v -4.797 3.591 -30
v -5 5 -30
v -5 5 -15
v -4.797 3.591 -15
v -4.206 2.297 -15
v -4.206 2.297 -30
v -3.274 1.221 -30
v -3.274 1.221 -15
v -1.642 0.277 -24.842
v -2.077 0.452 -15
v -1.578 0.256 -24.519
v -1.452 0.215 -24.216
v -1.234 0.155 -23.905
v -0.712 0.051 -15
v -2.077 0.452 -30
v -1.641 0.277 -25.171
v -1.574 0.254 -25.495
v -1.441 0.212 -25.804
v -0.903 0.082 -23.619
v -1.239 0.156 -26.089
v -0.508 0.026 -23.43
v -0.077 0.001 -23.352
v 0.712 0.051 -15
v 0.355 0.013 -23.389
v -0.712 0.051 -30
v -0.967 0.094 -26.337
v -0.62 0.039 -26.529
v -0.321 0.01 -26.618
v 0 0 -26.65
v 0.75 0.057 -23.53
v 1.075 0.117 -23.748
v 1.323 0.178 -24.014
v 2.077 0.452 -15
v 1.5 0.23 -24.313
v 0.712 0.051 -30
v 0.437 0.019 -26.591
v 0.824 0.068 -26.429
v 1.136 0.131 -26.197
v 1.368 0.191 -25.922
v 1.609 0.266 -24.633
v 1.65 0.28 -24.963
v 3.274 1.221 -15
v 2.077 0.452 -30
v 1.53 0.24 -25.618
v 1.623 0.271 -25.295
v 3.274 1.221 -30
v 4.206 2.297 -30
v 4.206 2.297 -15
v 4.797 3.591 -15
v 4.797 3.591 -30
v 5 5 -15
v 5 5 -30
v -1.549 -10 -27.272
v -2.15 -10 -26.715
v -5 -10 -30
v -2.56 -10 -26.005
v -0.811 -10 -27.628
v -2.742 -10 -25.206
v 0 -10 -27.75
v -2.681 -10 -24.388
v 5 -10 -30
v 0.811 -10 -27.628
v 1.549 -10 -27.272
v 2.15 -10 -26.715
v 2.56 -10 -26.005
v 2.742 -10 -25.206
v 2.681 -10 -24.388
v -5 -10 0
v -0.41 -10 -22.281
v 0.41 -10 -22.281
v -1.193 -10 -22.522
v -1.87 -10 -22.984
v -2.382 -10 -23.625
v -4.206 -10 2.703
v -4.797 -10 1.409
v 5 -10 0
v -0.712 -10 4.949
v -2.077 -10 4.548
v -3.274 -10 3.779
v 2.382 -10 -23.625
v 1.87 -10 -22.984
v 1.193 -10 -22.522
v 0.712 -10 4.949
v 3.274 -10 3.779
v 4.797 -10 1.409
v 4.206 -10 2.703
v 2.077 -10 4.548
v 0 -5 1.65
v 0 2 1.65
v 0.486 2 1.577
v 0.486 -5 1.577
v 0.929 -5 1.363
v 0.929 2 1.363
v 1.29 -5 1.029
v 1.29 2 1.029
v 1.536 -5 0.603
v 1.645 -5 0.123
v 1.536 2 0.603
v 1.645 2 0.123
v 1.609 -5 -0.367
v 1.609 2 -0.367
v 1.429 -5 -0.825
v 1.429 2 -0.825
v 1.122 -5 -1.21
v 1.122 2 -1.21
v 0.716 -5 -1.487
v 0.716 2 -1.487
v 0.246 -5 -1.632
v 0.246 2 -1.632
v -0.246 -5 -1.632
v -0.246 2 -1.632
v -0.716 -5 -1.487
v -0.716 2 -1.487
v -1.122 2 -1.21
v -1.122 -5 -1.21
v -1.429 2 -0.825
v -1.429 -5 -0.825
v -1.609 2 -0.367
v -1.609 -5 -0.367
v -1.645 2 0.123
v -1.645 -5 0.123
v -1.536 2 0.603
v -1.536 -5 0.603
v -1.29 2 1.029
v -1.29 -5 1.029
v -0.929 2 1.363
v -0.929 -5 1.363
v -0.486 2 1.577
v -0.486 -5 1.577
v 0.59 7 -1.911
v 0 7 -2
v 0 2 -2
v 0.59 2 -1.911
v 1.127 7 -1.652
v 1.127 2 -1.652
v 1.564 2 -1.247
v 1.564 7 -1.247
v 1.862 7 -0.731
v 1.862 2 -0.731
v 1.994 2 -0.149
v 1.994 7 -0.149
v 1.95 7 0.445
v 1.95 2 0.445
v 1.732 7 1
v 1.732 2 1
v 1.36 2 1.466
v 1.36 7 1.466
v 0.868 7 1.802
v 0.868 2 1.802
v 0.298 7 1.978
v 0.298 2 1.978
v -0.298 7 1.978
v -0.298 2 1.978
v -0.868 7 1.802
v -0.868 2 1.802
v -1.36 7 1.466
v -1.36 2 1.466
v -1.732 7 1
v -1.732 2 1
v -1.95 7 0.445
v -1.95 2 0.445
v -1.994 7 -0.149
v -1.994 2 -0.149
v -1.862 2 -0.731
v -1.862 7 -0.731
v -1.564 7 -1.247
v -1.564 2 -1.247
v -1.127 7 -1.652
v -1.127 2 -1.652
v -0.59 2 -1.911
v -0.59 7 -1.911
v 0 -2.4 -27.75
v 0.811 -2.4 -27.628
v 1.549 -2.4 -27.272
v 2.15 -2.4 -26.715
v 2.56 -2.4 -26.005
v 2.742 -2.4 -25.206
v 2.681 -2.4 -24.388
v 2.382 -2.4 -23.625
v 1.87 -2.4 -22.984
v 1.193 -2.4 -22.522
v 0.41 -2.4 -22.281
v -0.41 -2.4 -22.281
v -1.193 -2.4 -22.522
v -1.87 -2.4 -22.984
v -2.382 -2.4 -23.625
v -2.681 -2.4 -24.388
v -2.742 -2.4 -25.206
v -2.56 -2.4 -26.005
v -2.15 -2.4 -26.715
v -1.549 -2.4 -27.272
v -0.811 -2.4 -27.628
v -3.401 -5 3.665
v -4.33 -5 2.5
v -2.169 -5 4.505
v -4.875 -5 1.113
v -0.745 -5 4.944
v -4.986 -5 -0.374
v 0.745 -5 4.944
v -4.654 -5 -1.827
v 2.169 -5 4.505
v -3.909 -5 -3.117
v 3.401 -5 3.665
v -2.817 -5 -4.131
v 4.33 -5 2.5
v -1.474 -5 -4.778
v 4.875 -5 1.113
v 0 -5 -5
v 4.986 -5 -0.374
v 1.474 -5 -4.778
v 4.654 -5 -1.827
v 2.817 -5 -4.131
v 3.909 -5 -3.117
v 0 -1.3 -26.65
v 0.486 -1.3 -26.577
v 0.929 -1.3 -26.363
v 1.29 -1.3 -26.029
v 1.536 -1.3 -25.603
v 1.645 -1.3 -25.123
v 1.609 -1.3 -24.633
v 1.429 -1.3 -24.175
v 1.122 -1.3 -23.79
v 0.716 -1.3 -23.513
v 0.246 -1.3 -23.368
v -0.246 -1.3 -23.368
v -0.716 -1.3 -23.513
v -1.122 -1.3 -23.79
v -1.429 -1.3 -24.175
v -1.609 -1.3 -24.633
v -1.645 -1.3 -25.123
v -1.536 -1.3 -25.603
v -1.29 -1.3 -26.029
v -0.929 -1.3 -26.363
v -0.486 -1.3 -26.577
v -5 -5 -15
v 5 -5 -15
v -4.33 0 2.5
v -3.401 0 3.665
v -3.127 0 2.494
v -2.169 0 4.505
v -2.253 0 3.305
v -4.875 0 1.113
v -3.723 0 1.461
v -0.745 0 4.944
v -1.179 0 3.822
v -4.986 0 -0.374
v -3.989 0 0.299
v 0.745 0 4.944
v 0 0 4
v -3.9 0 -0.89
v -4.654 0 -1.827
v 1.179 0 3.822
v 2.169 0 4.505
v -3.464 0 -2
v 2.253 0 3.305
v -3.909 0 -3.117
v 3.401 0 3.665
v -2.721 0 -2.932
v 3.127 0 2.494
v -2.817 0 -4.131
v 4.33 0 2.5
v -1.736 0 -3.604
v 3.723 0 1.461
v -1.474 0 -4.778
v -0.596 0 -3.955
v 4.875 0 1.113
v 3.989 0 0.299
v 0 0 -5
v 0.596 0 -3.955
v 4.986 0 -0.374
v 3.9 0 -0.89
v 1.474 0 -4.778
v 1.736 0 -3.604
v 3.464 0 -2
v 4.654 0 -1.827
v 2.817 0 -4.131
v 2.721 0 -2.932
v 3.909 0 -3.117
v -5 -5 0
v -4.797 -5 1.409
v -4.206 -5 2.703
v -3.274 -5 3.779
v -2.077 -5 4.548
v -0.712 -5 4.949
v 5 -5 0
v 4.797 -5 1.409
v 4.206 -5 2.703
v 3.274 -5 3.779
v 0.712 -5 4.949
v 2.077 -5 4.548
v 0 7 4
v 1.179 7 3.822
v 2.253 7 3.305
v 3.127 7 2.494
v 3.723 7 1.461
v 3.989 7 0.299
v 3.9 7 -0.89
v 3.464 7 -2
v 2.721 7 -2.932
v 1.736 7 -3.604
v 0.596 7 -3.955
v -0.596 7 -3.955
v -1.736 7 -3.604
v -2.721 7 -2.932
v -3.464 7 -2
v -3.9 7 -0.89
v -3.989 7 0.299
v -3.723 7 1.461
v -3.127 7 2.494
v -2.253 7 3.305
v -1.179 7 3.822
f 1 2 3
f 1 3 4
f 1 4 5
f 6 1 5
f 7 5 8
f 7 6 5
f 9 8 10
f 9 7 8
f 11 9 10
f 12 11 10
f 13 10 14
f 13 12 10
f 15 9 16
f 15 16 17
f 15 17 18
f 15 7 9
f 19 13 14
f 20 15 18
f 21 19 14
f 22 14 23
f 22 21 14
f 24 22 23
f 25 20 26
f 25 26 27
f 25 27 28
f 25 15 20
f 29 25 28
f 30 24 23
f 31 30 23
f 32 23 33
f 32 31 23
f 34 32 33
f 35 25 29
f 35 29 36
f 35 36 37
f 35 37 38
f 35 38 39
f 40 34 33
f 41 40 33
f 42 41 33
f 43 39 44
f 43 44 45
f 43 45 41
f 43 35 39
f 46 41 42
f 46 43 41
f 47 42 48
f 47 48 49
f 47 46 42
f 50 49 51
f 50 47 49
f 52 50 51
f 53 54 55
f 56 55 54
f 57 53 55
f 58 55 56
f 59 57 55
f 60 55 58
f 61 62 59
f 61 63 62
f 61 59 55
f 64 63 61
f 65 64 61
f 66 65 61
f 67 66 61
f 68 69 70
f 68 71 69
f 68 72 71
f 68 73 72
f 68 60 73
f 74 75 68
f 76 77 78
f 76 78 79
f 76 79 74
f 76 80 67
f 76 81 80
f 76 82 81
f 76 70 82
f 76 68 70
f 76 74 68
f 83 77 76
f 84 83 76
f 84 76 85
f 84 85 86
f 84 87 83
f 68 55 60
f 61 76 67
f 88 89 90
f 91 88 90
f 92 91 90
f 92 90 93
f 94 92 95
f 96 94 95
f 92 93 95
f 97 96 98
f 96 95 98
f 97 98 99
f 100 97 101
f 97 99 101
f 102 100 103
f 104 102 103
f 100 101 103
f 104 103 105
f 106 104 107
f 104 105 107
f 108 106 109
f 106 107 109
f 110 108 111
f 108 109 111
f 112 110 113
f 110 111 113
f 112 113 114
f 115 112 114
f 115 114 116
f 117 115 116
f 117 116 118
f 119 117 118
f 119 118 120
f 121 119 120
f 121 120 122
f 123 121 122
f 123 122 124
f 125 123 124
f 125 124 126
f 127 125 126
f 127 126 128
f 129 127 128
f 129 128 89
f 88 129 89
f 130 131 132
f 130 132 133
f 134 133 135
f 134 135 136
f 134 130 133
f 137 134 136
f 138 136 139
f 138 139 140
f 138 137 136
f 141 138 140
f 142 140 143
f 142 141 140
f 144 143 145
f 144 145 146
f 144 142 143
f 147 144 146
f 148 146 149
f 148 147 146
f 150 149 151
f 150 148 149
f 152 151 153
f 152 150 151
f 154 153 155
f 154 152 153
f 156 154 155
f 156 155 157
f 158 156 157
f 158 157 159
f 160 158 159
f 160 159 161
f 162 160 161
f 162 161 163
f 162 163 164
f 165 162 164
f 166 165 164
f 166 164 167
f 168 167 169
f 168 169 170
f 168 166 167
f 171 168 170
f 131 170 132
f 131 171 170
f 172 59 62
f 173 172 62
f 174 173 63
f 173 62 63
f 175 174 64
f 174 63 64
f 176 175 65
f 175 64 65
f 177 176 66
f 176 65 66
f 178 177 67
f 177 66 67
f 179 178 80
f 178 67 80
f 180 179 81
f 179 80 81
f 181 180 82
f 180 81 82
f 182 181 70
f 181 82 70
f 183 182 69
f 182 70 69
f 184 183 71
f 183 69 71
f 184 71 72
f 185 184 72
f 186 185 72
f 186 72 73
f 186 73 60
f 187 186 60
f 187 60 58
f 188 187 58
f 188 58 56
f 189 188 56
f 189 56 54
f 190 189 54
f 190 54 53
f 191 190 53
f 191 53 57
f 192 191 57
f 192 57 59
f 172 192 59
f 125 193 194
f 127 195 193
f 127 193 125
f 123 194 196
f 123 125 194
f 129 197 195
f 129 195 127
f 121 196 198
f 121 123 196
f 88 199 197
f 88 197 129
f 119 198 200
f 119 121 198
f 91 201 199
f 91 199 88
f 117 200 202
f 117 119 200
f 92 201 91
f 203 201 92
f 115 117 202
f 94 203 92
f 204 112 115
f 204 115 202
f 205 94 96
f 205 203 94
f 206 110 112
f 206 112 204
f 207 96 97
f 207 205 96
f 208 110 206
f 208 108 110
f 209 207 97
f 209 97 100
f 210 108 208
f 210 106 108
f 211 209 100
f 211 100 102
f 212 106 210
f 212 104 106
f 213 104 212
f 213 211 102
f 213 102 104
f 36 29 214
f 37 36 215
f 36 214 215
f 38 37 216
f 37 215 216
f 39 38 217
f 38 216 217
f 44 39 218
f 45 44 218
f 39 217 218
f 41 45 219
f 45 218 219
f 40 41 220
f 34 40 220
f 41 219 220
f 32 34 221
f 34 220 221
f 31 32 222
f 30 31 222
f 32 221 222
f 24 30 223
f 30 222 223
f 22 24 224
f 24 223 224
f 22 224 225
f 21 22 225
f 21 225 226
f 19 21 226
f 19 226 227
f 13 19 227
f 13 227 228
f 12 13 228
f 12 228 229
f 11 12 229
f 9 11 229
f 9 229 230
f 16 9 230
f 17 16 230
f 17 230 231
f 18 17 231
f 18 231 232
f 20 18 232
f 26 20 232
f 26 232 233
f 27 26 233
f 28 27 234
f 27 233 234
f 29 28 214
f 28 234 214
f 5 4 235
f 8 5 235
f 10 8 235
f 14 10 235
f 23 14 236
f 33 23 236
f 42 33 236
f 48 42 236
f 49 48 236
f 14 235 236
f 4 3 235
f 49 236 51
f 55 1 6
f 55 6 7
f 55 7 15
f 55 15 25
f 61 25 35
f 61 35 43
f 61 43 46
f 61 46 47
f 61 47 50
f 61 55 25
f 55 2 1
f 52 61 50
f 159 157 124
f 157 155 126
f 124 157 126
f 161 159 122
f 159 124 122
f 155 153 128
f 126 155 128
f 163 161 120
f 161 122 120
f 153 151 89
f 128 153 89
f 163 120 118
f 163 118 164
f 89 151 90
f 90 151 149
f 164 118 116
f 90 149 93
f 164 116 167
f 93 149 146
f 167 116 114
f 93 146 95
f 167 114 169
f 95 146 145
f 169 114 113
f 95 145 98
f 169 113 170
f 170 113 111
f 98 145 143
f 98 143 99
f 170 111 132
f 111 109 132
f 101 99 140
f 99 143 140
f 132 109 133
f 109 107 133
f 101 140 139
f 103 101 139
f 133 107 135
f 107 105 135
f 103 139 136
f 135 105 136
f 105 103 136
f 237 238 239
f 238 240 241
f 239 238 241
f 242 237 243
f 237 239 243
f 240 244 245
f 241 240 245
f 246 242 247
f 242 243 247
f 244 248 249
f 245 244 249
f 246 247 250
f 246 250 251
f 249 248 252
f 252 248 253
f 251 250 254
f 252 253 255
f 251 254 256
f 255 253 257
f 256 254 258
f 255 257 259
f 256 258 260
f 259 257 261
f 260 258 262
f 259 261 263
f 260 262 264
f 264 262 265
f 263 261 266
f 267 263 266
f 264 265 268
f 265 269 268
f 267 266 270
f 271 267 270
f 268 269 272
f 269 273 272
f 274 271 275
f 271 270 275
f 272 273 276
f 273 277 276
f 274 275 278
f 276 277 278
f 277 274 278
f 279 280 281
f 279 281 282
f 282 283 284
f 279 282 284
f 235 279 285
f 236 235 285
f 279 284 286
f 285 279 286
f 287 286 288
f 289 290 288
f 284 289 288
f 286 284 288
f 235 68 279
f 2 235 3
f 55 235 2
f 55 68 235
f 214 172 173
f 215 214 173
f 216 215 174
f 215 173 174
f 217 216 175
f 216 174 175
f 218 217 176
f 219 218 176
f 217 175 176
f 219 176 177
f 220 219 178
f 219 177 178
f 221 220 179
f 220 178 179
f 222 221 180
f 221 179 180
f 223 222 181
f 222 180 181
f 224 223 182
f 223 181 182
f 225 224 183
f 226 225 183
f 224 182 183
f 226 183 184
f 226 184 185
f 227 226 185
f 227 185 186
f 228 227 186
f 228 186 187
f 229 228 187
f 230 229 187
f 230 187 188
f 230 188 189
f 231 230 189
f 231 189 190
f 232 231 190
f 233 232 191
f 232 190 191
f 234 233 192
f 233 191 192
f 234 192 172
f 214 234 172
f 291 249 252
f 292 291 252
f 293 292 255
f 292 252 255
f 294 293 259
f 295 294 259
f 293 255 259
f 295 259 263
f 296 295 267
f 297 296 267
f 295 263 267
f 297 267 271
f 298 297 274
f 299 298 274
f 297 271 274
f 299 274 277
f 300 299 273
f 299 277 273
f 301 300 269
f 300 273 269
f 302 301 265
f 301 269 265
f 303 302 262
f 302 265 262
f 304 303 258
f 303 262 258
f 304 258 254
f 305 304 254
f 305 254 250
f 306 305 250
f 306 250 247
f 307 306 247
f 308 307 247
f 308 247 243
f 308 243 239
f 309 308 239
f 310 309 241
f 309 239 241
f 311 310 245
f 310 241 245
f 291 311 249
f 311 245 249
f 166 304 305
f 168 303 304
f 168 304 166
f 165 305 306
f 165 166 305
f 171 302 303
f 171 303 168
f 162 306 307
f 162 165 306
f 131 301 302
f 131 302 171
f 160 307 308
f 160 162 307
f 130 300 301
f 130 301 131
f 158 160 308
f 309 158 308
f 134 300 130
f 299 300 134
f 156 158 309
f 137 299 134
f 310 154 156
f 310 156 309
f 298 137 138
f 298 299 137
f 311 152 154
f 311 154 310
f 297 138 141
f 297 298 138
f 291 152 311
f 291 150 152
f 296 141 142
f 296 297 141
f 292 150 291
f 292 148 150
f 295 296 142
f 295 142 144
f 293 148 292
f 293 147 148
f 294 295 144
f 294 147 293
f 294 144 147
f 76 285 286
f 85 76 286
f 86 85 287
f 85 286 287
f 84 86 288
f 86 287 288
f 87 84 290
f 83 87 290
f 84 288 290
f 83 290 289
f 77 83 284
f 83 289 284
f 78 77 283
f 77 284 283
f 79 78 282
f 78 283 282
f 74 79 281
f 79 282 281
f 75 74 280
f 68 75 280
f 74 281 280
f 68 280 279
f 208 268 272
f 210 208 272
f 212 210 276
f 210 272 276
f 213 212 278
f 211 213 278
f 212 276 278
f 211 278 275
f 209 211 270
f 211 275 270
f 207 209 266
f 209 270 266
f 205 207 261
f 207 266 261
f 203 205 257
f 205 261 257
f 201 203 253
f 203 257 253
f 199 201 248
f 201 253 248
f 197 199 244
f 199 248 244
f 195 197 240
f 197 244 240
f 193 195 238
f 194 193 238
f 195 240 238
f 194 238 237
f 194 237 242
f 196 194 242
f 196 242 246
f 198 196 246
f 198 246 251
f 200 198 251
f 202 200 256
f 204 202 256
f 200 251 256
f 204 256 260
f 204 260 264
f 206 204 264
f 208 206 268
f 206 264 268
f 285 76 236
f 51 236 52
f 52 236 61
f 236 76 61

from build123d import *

# Parameters (mm, degrees)
SKETCH2_R           = 4
BOSS_EXTRUDE1_DEPTH = 7
SKETCH3_R           = 5
BOSS_EXTRUDE2_DEPTH = 5
SKETCH4_R           = 1.65
CUT_EXTRUDE1_DEPTH  = 12
SKETCH5_R           = 2
CUT_EXTRUDE2_DEPTH  = 5
BOSS_EXTRUDE3_DEPTH = 5
SKETCH8_W           = 10
SKETCH8_H           = 15
BOSS_EXTRUDE4_DEPTH = 10
CUT_EXTRUDE3_DEPTH  = 15
SKETCH10_R          = 2.75
CUT_EXTRUDE4_DEPTH  = 7.5
SKETCH11_R          = 1.65
CUT_EXTRUDE5_DEPTH  = 32.862987933
CHAMFER2_SIZE       = 1.2


with BuildPart() as part:
    # Sketch2 → Boss-Extrude1 (new body)
    with BuildSketch(Plane(origin=(0, 0, 0), x_dir=(1, 0, 0), z_dir=(0, 1, 0))):
        with Locations(Location((0, 0, 0), (0, 0, 270))):
            Circle(SKETCH2_R)
    extrude(amount=BOSS_EXTRUDE1_DEPTH)

    # Sketch3 → Boss-Extrude2 (add)
    with BuildSketch(Plane.XZ):
        with Locations(Location((0, 0, 0), (0, 0, 270))):
            Circle(SKETCH3_R)
    extrude(amount=BOSS_EXTRUDE2_DEPTH)

    # Sketch4 → Cut-Extrude1 (cut)
    with BuildSketch(Plane(origin=(0, 7, 0), x_dir=(1, 0, 0), z_dir=(0, 1, 0))):
        with Locations(Location((0, 0, 0), (0, 0, 270))):
            Circle(SKETCH4_R)
    extrude(amount=-CUT_EXTRUDE1_DEPTH, mode=Mode.SUBTRACT)

    # Sketch5 → Cut-Extrude2 (cut)
    with BuildSketch(Plane.XZ.offset(-7)):
        with Locations(Location((0, 0, 0), (0, 0, 270))):
            Circle(SKETCH5_R)
    extrude(amount=CUT_EXTRUDE2_DEPTH, mode=Mode.SUBTRACT)


with BuildPart() as body_2:
    # Sketch7 → Boss-Extrude3 (new body)
    with BuildSketch(Plane.XZ.offset(5)):
        with BuildLine():
            Line((-5, 0), (-5, -30))
            Line((-5, -30), (5, -30))
            Line((5, -30), (5, 0))
            ThreePointArc((5, 0), (0, 5), (-5, 0))
        make_face()
    extrude(amount=BOSS_EXTRUDE3_DEPTH)

    # Sketch8 → Boss-Extrude4 (add)
    with BuildSketch(Plane(origin=(0, -5, 0), x_dir=(1, 0, 0), z_dir=(0, 1, 0))):
        with Locations((0, 22.5)):
            Rectangle(SKETCH8_W, SKETCH8_H)
    extrude(amount=BOSS_EXTRUDE4_DEPTH)

    # Sketch9 → Cut-Extrude3 (cut)
    with BuildSketch(Plane(origin=(0, 0, -30), x_dir=(-1, 0, 0), z_dir=(0, 0, -1))):
        with BuildLine():
            Line((-5, 5), (5, 5))
            ThreePointArc((5, 5), (0, 0), (-5, 5))
        make_face()
    extrude(amount=-CUT_EXTRUDE3_DEPTH, mode=Mode.SUBTRACT)

    # Sketch10 → Cut-Extrude4 (cut)
    with BuildSketch(Plane.XZ.offset(10)):
        with Locations(Location((0, -25, 0), (0, 0, 270))):
            Circle(SKETCH10_R)
    extrude(amount=-CUT_EXTRUDE4_DEPTH, mode=Mode.SUBTRACT)

    # Sketch11 → Cut-Extrude5 (cut, through all)
    with BuildSketch(Plane.XZ.offset(2.5)):
        with Locations(Location((0, -25, 0), (0, 0, 270))):
            Circle(SKETCH11_R)
    extrude(amount=-CUT_EXTRUDE5_DEPTH, mode=Mode.SUBTRACT)

    # Chamfer2
    # the kernel refuses this chamfer: 1.2 mm, written as the material it takes off along each edge
    with BuildSketch(Plane(origin=(0, -2.5, -25), x_dir=(0, 0, -1), z_dir=(-1, 0, 0))) as chamfer2_piece_1_section:
        Polygon((1.65, -CHAMFER2_SIZE), (1.65 + CHAMFER2_SIZE, 0), (1.65, 0), align=None)
    chamfer2_piece_1 = revolve(axis=Axis((0, -2.5, -25), (0, -1, 0)), mode=Mode.PRIVATE)
    chamfer2_piece_1 = chamfer2_piece_1 & Plane(origin=(0, -1.848254626, -25), x_dir=(0, 0, -1), z_dir=(0, -1, 0)) * Cylinder(2.75, 12, mode=Mode.PRIVATE)
    add(chamfer2_piece_1, mode=Mode.SUBTRACT)


solid = Compound([part.part, body_2.part])
